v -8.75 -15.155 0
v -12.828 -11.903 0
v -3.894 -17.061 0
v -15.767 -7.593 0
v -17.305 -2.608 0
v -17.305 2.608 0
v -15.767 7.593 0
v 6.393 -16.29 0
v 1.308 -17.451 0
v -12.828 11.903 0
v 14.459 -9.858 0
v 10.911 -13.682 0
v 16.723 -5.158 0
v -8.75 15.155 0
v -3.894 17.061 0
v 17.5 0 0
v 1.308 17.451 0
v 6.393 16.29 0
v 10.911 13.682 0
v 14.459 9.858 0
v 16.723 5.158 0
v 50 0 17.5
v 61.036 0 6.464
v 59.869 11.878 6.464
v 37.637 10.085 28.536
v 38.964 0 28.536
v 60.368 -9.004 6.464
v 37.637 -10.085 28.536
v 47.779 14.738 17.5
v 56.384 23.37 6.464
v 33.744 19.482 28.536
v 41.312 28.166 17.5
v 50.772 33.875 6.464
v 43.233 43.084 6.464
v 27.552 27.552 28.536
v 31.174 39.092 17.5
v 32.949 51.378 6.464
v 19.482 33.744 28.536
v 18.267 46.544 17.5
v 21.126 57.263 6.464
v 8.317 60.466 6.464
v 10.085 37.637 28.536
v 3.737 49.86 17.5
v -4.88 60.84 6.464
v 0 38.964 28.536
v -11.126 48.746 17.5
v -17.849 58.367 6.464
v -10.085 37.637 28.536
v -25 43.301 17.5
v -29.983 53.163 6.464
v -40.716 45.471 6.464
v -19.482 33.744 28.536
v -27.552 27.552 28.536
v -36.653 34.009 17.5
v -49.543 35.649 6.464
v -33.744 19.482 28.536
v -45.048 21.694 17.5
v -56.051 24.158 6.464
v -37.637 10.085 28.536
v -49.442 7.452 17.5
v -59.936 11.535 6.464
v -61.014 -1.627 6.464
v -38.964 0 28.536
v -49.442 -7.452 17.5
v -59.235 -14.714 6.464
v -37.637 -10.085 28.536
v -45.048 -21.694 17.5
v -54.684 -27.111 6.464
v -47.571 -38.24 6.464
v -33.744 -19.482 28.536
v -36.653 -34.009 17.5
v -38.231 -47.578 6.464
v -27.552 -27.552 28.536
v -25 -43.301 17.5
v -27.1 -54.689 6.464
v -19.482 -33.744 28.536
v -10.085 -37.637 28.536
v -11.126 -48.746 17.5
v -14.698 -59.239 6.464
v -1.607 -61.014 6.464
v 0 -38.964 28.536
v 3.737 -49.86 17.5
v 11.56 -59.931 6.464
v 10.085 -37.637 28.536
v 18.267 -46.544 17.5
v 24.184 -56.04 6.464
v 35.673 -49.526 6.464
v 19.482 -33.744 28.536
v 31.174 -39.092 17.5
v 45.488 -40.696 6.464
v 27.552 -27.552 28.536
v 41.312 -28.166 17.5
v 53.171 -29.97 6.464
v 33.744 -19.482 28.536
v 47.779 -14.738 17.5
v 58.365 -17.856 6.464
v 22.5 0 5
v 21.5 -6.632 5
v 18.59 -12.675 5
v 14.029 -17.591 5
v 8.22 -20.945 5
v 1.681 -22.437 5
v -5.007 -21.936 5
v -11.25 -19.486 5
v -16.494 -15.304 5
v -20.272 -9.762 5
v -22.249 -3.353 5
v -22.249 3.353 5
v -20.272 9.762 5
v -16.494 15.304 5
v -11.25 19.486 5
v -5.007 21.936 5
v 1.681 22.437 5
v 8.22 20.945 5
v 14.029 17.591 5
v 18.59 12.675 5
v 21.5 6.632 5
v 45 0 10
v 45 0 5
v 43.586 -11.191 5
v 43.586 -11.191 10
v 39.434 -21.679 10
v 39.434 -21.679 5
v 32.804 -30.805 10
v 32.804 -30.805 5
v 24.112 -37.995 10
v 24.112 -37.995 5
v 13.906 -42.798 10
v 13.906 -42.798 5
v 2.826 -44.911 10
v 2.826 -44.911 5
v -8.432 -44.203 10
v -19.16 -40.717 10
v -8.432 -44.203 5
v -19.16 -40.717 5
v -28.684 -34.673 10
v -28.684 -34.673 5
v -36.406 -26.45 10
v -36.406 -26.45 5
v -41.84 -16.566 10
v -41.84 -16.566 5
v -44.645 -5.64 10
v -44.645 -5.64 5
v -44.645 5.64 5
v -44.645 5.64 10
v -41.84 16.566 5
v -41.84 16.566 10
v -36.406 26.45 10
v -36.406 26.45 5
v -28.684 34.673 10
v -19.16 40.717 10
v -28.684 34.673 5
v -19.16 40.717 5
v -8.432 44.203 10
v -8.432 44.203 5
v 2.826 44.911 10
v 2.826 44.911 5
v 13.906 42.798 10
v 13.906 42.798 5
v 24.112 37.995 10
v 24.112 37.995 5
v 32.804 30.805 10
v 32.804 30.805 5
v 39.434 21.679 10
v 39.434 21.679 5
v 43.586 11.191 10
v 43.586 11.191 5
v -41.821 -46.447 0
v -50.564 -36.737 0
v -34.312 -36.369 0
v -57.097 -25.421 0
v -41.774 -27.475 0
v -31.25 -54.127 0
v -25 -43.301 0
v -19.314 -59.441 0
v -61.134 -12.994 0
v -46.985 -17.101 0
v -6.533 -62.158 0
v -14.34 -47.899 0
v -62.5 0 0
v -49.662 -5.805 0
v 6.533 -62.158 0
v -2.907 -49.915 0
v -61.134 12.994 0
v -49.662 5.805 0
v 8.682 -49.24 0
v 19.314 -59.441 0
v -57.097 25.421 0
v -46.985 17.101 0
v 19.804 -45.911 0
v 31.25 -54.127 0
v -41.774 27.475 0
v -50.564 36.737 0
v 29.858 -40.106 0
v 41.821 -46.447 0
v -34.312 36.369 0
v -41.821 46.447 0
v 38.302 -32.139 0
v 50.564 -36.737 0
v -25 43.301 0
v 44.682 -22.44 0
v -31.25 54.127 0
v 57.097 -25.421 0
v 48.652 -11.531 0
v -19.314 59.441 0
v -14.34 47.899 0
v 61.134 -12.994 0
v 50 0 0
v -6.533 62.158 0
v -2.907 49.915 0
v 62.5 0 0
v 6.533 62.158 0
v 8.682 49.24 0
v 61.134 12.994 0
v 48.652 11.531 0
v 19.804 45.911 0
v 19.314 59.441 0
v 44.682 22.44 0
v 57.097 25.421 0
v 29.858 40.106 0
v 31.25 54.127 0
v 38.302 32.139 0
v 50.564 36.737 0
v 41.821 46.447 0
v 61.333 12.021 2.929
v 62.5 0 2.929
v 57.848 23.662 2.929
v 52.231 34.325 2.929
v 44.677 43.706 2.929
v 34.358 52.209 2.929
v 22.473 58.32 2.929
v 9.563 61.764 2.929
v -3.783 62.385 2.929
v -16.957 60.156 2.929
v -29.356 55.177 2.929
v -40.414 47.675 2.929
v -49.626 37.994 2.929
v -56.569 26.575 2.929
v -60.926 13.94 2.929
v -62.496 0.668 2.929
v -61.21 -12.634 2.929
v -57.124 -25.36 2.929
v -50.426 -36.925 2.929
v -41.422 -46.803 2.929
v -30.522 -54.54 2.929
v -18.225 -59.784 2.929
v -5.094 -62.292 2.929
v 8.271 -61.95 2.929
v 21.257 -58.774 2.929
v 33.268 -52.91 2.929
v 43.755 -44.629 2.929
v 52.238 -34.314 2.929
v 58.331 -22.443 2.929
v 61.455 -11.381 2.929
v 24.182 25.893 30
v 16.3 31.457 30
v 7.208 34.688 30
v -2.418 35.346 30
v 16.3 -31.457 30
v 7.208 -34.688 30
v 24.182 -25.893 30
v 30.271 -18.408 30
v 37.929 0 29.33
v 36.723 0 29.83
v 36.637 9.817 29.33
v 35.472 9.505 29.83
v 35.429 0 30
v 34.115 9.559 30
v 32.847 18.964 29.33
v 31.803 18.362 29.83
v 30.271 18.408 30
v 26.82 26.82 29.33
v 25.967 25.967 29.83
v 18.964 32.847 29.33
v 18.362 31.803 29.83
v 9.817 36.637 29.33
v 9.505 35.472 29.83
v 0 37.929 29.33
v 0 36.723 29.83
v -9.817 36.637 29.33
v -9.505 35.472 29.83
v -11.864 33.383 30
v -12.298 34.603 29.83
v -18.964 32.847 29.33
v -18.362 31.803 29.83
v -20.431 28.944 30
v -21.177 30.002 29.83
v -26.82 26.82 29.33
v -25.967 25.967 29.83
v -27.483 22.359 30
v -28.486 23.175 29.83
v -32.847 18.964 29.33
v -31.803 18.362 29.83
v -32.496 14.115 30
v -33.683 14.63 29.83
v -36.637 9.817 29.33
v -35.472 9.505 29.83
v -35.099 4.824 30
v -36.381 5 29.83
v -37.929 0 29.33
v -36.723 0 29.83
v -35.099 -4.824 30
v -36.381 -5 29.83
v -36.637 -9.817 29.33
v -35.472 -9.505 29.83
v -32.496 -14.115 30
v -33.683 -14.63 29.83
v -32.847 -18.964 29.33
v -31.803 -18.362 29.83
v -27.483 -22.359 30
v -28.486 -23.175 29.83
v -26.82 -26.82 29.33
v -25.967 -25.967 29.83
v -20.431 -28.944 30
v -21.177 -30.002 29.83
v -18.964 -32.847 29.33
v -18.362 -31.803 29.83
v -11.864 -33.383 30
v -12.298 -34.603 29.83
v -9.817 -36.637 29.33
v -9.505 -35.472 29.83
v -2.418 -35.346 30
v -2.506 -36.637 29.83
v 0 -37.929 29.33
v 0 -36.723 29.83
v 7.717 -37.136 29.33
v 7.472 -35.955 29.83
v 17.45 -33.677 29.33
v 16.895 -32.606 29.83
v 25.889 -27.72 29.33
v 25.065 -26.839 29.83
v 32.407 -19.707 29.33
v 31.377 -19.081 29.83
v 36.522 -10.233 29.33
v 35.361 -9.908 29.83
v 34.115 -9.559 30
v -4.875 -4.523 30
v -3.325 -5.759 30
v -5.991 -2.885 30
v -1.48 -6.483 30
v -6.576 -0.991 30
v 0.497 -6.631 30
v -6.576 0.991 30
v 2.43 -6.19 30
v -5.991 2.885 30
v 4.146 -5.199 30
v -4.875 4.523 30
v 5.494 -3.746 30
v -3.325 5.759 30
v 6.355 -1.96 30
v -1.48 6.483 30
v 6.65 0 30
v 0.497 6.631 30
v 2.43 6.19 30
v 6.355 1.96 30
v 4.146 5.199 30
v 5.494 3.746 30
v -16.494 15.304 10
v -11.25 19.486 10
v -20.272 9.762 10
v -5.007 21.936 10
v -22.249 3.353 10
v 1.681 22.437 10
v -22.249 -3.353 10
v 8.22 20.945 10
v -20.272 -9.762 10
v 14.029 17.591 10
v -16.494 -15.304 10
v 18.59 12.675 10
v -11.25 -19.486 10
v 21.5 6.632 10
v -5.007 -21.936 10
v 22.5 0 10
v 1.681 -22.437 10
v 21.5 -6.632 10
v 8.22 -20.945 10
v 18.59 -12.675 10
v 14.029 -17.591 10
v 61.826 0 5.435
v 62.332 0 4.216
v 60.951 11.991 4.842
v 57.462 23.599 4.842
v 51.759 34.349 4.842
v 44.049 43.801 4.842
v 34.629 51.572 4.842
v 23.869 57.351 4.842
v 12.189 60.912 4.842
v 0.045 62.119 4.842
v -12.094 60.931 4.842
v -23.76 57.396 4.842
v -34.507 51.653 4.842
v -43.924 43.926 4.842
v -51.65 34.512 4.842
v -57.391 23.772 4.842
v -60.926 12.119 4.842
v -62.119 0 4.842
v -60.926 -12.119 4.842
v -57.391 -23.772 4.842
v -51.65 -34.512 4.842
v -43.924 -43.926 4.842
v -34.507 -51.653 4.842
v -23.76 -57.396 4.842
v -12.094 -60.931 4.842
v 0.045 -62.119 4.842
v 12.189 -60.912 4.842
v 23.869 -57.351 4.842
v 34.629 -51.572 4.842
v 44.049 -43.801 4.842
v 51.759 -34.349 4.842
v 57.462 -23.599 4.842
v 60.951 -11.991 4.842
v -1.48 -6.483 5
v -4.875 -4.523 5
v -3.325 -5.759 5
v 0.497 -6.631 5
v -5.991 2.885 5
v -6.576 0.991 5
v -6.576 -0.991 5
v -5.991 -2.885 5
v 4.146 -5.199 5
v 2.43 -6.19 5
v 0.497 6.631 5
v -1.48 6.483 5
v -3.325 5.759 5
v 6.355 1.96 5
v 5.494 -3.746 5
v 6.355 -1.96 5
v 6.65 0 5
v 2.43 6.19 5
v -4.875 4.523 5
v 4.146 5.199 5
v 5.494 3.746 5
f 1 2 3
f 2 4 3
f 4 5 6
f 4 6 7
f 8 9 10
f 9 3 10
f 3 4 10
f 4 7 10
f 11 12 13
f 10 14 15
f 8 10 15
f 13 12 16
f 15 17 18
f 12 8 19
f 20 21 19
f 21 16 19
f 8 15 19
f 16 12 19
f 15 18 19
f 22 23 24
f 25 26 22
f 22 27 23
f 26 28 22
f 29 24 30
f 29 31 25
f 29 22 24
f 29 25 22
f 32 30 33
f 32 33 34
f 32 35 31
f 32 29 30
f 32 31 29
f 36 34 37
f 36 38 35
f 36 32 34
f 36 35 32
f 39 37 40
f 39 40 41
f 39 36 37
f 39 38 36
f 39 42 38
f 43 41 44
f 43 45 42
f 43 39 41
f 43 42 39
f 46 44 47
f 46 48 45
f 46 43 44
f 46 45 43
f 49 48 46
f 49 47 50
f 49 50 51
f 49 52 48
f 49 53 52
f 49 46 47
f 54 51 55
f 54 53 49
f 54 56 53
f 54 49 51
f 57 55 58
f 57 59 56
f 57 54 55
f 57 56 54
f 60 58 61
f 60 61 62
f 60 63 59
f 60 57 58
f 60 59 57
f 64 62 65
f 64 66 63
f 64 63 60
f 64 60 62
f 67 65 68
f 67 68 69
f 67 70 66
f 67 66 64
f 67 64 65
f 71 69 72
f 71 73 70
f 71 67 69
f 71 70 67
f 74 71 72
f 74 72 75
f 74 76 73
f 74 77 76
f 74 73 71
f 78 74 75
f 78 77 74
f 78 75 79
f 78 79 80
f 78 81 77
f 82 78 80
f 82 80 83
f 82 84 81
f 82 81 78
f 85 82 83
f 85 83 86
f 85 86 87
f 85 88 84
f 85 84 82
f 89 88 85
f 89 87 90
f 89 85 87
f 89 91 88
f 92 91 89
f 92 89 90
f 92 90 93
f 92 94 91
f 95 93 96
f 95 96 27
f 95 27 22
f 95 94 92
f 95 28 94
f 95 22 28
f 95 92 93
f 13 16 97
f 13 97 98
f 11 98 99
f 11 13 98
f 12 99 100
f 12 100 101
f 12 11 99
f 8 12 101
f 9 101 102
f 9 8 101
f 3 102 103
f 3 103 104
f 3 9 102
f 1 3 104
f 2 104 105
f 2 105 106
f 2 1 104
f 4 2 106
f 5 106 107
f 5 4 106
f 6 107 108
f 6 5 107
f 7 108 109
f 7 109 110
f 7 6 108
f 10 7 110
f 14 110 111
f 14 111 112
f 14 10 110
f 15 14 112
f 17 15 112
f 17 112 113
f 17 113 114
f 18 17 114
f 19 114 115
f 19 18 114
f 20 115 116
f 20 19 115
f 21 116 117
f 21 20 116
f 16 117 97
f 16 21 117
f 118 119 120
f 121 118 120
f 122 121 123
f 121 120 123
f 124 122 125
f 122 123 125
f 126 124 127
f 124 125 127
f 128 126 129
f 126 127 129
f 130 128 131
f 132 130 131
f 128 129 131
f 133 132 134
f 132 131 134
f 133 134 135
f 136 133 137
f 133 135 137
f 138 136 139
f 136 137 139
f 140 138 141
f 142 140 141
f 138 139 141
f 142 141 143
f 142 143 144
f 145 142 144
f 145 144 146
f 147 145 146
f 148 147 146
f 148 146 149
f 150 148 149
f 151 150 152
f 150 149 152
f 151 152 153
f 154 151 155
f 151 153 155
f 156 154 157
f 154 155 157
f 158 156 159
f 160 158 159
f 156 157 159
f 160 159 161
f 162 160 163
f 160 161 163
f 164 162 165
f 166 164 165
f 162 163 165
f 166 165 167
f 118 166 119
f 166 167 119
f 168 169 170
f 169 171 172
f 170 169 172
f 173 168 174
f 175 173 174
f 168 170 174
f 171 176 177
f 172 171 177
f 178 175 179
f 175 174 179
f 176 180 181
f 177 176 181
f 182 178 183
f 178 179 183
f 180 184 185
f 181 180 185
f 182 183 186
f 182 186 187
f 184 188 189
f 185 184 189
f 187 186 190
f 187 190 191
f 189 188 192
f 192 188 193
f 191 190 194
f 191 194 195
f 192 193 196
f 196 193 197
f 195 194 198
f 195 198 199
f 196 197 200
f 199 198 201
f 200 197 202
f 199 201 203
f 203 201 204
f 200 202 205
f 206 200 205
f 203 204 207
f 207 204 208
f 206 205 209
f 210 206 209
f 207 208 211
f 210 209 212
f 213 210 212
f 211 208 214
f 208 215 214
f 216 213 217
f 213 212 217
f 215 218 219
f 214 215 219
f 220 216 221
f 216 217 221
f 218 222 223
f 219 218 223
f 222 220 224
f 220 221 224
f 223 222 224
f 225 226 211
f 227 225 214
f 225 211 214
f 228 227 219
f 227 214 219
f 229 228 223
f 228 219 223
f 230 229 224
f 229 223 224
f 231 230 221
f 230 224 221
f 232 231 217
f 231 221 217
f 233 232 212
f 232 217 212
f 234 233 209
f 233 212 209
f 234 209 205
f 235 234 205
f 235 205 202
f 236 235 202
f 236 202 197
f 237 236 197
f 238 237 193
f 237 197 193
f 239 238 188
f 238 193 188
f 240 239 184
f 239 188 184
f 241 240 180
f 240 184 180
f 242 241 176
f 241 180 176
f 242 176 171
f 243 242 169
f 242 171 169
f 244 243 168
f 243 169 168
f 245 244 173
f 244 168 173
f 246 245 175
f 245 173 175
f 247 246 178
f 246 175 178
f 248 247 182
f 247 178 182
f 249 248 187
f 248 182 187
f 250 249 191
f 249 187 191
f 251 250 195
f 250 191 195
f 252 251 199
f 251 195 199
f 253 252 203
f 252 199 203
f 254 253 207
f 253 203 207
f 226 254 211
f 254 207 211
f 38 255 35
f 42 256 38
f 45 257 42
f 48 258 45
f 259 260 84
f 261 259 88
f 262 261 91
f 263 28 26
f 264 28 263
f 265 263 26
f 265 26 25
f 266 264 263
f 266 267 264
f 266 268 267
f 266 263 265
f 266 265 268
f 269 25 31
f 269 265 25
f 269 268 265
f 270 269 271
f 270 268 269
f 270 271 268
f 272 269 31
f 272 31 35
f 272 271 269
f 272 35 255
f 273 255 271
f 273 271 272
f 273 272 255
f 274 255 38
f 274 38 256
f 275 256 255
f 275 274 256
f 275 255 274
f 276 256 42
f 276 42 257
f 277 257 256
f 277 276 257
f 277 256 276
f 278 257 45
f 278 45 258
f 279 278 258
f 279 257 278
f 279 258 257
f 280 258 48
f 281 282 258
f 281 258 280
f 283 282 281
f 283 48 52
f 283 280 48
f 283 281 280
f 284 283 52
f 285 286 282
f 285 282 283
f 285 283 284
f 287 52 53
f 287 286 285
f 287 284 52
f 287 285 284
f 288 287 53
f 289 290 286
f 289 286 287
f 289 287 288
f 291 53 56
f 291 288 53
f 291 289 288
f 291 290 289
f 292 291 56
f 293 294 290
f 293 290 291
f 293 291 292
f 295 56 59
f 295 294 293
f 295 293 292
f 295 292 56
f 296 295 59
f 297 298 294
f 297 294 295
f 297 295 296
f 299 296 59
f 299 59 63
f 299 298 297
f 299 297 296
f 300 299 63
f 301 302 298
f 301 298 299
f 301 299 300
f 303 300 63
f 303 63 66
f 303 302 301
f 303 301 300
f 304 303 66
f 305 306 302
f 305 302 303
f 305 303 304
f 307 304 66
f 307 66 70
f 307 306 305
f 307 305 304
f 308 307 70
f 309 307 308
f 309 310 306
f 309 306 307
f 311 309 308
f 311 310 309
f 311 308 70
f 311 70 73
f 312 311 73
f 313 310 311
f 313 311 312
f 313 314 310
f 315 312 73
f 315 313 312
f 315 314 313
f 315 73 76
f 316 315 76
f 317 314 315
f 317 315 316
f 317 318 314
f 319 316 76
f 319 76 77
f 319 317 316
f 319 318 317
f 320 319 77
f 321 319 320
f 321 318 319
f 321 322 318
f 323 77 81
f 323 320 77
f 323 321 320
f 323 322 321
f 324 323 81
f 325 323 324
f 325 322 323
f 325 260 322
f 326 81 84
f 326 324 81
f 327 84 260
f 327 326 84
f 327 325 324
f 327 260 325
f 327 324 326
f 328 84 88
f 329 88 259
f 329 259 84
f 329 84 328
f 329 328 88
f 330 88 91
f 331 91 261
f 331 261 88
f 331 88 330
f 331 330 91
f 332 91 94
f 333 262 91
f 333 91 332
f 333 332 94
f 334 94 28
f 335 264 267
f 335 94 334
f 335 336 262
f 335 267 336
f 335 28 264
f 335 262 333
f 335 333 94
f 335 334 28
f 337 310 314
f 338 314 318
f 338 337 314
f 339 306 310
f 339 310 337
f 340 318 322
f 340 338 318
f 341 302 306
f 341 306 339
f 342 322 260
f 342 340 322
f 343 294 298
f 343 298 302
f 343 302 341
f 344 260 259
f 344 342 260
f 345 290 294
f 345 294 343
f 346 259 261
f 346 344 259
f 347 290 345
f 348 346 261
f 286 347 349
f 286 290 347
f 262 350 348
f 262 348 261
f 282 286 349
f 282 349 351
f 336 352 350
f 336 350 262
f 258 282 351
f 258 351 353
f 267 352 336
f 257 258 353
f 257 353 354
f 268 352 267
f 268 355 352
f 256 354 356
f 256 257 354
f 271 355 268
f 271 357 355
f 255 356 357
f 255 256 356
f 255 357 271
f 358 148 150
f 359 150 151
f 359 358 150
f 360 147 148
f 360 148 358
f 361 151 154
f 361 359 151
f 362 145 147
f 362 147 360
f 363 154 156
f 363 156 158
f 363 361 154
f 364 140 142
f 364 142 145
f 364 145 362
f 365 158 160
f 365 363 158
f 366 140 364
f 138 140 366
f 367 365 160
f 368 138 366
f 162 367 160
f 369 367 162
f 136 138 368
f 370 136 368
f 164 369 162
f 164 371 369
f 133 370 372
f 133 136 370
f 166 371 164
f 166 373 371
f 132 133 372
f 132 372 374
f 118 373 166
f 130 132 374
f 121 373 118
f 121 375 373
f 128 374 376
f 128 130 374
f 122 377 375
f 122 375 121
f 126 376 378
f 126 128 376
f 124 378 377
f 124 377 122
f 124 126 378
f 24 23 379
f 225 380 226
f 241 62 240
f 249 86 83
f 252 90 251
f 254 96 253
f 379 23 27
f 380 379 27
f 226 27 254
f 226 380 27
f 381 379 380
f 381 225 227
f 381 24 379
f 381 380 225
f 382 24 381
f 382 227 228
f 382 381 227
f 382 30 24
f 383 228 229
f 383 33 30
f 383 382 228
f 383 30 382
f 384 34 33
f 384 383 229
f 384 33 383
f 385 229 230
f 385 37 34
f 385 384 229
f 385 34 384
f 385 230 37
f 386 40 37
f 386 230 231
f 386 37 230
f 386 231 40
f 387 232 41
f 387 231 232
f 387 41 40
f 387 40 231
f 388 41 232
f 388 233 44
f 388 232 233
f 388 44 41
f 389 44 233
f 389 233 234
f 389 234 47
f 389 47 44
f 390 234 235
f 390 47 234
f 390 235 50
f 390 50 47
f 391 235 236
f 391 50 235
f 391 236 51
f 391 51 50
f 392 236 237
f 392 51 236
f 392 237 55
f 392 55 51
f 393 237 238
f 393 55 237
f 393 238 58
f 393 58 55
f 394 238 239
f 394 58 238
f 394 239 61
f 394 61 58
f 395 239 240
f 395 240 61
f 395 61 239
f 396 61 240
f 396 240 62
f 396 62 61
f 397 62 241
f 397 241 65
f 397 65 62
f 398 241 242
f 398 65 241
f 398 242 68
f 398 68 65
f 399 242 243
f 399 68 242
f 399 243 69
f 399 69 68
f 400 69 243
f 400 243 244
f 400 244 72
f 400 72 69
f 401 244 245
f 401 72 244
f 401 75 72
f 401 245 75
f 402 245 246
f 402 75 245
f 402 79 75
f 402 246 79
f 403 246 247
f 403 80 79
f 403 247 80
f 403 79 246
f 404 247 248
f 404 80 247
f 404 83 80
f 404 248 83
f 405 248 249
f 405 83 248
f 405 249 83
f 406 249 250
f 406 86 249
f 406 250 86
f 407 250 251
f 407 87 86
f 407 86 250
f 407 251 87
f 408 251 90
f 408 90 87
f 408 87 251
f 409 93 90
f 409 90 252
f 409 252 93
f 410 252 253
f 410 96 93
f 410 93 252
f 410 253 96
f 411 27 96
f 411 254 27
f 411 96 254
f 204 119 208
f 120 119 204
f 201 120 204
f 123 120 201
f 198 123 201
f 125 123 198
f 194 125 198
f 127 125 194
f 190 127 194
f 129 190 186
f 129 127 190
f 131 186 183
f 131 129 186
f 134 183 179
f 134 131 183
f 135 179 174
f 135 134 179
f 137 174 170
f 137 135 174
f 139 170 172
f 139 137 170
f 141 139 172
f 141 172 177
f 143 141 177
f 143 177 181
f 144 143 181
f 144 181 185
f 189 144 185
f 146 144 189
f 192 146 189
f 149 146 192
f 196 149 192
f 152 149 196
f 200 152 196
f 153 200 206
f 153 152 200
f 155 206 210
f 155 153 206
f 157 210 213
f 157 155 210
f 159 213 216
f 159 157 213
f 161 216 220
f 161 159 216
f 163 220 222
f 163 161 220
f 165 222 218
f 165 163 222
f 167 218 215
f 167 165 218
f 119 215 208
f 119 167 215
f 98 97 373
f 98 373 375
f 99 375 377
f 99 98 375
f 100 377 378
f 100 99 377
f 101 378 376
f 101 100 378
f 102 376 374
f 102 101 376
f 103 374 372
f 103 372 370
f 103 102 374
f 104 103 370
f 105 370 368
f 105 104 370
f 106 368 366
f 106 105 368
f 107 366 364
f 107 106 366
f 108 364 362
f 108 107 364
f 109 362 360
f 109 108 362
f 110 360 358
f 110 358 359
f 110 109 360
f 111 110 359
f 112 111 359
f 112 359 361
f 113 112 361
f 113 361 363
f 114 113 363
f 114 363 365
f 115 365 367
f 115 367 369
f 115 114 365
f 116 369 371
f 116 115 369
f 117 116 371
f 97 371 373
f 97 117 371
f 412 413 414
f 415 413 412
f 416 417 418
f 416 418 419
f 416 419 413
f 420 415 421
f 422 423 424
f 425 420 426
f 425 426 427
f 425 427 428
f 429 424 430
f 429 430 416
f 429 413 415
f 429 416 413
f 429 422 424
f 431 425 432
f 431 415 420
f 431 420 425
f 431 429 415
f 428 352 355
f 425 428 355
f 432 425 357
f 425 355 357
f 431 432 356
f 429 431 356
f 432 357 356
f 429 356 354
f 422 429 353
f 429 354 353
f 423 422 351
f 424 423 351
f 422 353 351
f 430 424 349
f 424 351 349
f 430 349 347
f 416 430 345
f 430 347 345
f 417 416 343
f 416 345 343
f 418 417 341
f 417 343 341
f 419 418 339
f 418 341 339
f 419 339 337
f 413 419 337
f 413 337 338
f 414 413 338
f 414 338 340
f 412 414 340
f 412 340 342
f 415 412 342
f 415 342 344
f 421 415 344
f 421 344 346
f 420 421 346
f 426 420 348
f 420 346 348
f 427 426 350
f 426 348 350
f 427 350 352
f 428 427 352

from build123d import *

# Parameters (mm, degrees)
F0_R     = 62.5
F1_DEPTH = 30
F2_SIZE  = 25
F3_R     = 6.65
F4_DEPTH = 25
F5_R     = 5
F6_R     = 5
F7_R     = 45
F7_R_2   = 22.5
F8_DEPTH = 10
F9_SIZE  = 5


with BuildPart() as f1:
    # F0 (on Top) → F1 (new body)
    with BuildSketch(Plane.XY):
        Circle(F0_R)
    extrude(amount=F1_DEPTH)

    # F2
    f2_edges = [f1.edges().sort_by_distance(p)[0] for p in [
        (-62.5, 0, 30),
    ]]
    chamfer(f2_edges, length=F2_SIZE)

    # F3 (on face) → F4 (cut)
    with BuildSketch(Plane.XY.offset(30)):
        Circle(F3_R)
    extrude(amount=-F4_DEPTH, mode=Mode.SUBTRACT)

    # F5
    f5_edges = [f1.edges().sort_by_distance(p)[0] for p in [
        (-37.5, 0, 30),
    ]]
    fillet(f5_edges, radius=F5_R)

    # F6
    f6_edges = [f1.edges().sort_by_distance(p)[0] for p in [
        (-62.5, 0, 5),
    ]]
    fillet(f6_edges, radius=F6_R)

    # F7 (on face) → F8 (cut)
    with BuildSketch(Plane(origin=(0, 0, 0), x_dir=(1, 0, 0), z_dir=(0, 0, -1))):
        Circle(F7_R)
        Circle(F7_R_2, mode=Mode.SUBTRACT)
    extrude(amount=-F8_DEPTH, mode=Mode.SUBTRACT)

    # F9
    f9_edges = [f1.edges().sort_by_distance(p)[0] for p in [
        (-45, 0, 0),
        (-22.5, 0, 0),
    ]]
    chamfer(f9_edges, length=F9_SIZE)


solid = f1.part
